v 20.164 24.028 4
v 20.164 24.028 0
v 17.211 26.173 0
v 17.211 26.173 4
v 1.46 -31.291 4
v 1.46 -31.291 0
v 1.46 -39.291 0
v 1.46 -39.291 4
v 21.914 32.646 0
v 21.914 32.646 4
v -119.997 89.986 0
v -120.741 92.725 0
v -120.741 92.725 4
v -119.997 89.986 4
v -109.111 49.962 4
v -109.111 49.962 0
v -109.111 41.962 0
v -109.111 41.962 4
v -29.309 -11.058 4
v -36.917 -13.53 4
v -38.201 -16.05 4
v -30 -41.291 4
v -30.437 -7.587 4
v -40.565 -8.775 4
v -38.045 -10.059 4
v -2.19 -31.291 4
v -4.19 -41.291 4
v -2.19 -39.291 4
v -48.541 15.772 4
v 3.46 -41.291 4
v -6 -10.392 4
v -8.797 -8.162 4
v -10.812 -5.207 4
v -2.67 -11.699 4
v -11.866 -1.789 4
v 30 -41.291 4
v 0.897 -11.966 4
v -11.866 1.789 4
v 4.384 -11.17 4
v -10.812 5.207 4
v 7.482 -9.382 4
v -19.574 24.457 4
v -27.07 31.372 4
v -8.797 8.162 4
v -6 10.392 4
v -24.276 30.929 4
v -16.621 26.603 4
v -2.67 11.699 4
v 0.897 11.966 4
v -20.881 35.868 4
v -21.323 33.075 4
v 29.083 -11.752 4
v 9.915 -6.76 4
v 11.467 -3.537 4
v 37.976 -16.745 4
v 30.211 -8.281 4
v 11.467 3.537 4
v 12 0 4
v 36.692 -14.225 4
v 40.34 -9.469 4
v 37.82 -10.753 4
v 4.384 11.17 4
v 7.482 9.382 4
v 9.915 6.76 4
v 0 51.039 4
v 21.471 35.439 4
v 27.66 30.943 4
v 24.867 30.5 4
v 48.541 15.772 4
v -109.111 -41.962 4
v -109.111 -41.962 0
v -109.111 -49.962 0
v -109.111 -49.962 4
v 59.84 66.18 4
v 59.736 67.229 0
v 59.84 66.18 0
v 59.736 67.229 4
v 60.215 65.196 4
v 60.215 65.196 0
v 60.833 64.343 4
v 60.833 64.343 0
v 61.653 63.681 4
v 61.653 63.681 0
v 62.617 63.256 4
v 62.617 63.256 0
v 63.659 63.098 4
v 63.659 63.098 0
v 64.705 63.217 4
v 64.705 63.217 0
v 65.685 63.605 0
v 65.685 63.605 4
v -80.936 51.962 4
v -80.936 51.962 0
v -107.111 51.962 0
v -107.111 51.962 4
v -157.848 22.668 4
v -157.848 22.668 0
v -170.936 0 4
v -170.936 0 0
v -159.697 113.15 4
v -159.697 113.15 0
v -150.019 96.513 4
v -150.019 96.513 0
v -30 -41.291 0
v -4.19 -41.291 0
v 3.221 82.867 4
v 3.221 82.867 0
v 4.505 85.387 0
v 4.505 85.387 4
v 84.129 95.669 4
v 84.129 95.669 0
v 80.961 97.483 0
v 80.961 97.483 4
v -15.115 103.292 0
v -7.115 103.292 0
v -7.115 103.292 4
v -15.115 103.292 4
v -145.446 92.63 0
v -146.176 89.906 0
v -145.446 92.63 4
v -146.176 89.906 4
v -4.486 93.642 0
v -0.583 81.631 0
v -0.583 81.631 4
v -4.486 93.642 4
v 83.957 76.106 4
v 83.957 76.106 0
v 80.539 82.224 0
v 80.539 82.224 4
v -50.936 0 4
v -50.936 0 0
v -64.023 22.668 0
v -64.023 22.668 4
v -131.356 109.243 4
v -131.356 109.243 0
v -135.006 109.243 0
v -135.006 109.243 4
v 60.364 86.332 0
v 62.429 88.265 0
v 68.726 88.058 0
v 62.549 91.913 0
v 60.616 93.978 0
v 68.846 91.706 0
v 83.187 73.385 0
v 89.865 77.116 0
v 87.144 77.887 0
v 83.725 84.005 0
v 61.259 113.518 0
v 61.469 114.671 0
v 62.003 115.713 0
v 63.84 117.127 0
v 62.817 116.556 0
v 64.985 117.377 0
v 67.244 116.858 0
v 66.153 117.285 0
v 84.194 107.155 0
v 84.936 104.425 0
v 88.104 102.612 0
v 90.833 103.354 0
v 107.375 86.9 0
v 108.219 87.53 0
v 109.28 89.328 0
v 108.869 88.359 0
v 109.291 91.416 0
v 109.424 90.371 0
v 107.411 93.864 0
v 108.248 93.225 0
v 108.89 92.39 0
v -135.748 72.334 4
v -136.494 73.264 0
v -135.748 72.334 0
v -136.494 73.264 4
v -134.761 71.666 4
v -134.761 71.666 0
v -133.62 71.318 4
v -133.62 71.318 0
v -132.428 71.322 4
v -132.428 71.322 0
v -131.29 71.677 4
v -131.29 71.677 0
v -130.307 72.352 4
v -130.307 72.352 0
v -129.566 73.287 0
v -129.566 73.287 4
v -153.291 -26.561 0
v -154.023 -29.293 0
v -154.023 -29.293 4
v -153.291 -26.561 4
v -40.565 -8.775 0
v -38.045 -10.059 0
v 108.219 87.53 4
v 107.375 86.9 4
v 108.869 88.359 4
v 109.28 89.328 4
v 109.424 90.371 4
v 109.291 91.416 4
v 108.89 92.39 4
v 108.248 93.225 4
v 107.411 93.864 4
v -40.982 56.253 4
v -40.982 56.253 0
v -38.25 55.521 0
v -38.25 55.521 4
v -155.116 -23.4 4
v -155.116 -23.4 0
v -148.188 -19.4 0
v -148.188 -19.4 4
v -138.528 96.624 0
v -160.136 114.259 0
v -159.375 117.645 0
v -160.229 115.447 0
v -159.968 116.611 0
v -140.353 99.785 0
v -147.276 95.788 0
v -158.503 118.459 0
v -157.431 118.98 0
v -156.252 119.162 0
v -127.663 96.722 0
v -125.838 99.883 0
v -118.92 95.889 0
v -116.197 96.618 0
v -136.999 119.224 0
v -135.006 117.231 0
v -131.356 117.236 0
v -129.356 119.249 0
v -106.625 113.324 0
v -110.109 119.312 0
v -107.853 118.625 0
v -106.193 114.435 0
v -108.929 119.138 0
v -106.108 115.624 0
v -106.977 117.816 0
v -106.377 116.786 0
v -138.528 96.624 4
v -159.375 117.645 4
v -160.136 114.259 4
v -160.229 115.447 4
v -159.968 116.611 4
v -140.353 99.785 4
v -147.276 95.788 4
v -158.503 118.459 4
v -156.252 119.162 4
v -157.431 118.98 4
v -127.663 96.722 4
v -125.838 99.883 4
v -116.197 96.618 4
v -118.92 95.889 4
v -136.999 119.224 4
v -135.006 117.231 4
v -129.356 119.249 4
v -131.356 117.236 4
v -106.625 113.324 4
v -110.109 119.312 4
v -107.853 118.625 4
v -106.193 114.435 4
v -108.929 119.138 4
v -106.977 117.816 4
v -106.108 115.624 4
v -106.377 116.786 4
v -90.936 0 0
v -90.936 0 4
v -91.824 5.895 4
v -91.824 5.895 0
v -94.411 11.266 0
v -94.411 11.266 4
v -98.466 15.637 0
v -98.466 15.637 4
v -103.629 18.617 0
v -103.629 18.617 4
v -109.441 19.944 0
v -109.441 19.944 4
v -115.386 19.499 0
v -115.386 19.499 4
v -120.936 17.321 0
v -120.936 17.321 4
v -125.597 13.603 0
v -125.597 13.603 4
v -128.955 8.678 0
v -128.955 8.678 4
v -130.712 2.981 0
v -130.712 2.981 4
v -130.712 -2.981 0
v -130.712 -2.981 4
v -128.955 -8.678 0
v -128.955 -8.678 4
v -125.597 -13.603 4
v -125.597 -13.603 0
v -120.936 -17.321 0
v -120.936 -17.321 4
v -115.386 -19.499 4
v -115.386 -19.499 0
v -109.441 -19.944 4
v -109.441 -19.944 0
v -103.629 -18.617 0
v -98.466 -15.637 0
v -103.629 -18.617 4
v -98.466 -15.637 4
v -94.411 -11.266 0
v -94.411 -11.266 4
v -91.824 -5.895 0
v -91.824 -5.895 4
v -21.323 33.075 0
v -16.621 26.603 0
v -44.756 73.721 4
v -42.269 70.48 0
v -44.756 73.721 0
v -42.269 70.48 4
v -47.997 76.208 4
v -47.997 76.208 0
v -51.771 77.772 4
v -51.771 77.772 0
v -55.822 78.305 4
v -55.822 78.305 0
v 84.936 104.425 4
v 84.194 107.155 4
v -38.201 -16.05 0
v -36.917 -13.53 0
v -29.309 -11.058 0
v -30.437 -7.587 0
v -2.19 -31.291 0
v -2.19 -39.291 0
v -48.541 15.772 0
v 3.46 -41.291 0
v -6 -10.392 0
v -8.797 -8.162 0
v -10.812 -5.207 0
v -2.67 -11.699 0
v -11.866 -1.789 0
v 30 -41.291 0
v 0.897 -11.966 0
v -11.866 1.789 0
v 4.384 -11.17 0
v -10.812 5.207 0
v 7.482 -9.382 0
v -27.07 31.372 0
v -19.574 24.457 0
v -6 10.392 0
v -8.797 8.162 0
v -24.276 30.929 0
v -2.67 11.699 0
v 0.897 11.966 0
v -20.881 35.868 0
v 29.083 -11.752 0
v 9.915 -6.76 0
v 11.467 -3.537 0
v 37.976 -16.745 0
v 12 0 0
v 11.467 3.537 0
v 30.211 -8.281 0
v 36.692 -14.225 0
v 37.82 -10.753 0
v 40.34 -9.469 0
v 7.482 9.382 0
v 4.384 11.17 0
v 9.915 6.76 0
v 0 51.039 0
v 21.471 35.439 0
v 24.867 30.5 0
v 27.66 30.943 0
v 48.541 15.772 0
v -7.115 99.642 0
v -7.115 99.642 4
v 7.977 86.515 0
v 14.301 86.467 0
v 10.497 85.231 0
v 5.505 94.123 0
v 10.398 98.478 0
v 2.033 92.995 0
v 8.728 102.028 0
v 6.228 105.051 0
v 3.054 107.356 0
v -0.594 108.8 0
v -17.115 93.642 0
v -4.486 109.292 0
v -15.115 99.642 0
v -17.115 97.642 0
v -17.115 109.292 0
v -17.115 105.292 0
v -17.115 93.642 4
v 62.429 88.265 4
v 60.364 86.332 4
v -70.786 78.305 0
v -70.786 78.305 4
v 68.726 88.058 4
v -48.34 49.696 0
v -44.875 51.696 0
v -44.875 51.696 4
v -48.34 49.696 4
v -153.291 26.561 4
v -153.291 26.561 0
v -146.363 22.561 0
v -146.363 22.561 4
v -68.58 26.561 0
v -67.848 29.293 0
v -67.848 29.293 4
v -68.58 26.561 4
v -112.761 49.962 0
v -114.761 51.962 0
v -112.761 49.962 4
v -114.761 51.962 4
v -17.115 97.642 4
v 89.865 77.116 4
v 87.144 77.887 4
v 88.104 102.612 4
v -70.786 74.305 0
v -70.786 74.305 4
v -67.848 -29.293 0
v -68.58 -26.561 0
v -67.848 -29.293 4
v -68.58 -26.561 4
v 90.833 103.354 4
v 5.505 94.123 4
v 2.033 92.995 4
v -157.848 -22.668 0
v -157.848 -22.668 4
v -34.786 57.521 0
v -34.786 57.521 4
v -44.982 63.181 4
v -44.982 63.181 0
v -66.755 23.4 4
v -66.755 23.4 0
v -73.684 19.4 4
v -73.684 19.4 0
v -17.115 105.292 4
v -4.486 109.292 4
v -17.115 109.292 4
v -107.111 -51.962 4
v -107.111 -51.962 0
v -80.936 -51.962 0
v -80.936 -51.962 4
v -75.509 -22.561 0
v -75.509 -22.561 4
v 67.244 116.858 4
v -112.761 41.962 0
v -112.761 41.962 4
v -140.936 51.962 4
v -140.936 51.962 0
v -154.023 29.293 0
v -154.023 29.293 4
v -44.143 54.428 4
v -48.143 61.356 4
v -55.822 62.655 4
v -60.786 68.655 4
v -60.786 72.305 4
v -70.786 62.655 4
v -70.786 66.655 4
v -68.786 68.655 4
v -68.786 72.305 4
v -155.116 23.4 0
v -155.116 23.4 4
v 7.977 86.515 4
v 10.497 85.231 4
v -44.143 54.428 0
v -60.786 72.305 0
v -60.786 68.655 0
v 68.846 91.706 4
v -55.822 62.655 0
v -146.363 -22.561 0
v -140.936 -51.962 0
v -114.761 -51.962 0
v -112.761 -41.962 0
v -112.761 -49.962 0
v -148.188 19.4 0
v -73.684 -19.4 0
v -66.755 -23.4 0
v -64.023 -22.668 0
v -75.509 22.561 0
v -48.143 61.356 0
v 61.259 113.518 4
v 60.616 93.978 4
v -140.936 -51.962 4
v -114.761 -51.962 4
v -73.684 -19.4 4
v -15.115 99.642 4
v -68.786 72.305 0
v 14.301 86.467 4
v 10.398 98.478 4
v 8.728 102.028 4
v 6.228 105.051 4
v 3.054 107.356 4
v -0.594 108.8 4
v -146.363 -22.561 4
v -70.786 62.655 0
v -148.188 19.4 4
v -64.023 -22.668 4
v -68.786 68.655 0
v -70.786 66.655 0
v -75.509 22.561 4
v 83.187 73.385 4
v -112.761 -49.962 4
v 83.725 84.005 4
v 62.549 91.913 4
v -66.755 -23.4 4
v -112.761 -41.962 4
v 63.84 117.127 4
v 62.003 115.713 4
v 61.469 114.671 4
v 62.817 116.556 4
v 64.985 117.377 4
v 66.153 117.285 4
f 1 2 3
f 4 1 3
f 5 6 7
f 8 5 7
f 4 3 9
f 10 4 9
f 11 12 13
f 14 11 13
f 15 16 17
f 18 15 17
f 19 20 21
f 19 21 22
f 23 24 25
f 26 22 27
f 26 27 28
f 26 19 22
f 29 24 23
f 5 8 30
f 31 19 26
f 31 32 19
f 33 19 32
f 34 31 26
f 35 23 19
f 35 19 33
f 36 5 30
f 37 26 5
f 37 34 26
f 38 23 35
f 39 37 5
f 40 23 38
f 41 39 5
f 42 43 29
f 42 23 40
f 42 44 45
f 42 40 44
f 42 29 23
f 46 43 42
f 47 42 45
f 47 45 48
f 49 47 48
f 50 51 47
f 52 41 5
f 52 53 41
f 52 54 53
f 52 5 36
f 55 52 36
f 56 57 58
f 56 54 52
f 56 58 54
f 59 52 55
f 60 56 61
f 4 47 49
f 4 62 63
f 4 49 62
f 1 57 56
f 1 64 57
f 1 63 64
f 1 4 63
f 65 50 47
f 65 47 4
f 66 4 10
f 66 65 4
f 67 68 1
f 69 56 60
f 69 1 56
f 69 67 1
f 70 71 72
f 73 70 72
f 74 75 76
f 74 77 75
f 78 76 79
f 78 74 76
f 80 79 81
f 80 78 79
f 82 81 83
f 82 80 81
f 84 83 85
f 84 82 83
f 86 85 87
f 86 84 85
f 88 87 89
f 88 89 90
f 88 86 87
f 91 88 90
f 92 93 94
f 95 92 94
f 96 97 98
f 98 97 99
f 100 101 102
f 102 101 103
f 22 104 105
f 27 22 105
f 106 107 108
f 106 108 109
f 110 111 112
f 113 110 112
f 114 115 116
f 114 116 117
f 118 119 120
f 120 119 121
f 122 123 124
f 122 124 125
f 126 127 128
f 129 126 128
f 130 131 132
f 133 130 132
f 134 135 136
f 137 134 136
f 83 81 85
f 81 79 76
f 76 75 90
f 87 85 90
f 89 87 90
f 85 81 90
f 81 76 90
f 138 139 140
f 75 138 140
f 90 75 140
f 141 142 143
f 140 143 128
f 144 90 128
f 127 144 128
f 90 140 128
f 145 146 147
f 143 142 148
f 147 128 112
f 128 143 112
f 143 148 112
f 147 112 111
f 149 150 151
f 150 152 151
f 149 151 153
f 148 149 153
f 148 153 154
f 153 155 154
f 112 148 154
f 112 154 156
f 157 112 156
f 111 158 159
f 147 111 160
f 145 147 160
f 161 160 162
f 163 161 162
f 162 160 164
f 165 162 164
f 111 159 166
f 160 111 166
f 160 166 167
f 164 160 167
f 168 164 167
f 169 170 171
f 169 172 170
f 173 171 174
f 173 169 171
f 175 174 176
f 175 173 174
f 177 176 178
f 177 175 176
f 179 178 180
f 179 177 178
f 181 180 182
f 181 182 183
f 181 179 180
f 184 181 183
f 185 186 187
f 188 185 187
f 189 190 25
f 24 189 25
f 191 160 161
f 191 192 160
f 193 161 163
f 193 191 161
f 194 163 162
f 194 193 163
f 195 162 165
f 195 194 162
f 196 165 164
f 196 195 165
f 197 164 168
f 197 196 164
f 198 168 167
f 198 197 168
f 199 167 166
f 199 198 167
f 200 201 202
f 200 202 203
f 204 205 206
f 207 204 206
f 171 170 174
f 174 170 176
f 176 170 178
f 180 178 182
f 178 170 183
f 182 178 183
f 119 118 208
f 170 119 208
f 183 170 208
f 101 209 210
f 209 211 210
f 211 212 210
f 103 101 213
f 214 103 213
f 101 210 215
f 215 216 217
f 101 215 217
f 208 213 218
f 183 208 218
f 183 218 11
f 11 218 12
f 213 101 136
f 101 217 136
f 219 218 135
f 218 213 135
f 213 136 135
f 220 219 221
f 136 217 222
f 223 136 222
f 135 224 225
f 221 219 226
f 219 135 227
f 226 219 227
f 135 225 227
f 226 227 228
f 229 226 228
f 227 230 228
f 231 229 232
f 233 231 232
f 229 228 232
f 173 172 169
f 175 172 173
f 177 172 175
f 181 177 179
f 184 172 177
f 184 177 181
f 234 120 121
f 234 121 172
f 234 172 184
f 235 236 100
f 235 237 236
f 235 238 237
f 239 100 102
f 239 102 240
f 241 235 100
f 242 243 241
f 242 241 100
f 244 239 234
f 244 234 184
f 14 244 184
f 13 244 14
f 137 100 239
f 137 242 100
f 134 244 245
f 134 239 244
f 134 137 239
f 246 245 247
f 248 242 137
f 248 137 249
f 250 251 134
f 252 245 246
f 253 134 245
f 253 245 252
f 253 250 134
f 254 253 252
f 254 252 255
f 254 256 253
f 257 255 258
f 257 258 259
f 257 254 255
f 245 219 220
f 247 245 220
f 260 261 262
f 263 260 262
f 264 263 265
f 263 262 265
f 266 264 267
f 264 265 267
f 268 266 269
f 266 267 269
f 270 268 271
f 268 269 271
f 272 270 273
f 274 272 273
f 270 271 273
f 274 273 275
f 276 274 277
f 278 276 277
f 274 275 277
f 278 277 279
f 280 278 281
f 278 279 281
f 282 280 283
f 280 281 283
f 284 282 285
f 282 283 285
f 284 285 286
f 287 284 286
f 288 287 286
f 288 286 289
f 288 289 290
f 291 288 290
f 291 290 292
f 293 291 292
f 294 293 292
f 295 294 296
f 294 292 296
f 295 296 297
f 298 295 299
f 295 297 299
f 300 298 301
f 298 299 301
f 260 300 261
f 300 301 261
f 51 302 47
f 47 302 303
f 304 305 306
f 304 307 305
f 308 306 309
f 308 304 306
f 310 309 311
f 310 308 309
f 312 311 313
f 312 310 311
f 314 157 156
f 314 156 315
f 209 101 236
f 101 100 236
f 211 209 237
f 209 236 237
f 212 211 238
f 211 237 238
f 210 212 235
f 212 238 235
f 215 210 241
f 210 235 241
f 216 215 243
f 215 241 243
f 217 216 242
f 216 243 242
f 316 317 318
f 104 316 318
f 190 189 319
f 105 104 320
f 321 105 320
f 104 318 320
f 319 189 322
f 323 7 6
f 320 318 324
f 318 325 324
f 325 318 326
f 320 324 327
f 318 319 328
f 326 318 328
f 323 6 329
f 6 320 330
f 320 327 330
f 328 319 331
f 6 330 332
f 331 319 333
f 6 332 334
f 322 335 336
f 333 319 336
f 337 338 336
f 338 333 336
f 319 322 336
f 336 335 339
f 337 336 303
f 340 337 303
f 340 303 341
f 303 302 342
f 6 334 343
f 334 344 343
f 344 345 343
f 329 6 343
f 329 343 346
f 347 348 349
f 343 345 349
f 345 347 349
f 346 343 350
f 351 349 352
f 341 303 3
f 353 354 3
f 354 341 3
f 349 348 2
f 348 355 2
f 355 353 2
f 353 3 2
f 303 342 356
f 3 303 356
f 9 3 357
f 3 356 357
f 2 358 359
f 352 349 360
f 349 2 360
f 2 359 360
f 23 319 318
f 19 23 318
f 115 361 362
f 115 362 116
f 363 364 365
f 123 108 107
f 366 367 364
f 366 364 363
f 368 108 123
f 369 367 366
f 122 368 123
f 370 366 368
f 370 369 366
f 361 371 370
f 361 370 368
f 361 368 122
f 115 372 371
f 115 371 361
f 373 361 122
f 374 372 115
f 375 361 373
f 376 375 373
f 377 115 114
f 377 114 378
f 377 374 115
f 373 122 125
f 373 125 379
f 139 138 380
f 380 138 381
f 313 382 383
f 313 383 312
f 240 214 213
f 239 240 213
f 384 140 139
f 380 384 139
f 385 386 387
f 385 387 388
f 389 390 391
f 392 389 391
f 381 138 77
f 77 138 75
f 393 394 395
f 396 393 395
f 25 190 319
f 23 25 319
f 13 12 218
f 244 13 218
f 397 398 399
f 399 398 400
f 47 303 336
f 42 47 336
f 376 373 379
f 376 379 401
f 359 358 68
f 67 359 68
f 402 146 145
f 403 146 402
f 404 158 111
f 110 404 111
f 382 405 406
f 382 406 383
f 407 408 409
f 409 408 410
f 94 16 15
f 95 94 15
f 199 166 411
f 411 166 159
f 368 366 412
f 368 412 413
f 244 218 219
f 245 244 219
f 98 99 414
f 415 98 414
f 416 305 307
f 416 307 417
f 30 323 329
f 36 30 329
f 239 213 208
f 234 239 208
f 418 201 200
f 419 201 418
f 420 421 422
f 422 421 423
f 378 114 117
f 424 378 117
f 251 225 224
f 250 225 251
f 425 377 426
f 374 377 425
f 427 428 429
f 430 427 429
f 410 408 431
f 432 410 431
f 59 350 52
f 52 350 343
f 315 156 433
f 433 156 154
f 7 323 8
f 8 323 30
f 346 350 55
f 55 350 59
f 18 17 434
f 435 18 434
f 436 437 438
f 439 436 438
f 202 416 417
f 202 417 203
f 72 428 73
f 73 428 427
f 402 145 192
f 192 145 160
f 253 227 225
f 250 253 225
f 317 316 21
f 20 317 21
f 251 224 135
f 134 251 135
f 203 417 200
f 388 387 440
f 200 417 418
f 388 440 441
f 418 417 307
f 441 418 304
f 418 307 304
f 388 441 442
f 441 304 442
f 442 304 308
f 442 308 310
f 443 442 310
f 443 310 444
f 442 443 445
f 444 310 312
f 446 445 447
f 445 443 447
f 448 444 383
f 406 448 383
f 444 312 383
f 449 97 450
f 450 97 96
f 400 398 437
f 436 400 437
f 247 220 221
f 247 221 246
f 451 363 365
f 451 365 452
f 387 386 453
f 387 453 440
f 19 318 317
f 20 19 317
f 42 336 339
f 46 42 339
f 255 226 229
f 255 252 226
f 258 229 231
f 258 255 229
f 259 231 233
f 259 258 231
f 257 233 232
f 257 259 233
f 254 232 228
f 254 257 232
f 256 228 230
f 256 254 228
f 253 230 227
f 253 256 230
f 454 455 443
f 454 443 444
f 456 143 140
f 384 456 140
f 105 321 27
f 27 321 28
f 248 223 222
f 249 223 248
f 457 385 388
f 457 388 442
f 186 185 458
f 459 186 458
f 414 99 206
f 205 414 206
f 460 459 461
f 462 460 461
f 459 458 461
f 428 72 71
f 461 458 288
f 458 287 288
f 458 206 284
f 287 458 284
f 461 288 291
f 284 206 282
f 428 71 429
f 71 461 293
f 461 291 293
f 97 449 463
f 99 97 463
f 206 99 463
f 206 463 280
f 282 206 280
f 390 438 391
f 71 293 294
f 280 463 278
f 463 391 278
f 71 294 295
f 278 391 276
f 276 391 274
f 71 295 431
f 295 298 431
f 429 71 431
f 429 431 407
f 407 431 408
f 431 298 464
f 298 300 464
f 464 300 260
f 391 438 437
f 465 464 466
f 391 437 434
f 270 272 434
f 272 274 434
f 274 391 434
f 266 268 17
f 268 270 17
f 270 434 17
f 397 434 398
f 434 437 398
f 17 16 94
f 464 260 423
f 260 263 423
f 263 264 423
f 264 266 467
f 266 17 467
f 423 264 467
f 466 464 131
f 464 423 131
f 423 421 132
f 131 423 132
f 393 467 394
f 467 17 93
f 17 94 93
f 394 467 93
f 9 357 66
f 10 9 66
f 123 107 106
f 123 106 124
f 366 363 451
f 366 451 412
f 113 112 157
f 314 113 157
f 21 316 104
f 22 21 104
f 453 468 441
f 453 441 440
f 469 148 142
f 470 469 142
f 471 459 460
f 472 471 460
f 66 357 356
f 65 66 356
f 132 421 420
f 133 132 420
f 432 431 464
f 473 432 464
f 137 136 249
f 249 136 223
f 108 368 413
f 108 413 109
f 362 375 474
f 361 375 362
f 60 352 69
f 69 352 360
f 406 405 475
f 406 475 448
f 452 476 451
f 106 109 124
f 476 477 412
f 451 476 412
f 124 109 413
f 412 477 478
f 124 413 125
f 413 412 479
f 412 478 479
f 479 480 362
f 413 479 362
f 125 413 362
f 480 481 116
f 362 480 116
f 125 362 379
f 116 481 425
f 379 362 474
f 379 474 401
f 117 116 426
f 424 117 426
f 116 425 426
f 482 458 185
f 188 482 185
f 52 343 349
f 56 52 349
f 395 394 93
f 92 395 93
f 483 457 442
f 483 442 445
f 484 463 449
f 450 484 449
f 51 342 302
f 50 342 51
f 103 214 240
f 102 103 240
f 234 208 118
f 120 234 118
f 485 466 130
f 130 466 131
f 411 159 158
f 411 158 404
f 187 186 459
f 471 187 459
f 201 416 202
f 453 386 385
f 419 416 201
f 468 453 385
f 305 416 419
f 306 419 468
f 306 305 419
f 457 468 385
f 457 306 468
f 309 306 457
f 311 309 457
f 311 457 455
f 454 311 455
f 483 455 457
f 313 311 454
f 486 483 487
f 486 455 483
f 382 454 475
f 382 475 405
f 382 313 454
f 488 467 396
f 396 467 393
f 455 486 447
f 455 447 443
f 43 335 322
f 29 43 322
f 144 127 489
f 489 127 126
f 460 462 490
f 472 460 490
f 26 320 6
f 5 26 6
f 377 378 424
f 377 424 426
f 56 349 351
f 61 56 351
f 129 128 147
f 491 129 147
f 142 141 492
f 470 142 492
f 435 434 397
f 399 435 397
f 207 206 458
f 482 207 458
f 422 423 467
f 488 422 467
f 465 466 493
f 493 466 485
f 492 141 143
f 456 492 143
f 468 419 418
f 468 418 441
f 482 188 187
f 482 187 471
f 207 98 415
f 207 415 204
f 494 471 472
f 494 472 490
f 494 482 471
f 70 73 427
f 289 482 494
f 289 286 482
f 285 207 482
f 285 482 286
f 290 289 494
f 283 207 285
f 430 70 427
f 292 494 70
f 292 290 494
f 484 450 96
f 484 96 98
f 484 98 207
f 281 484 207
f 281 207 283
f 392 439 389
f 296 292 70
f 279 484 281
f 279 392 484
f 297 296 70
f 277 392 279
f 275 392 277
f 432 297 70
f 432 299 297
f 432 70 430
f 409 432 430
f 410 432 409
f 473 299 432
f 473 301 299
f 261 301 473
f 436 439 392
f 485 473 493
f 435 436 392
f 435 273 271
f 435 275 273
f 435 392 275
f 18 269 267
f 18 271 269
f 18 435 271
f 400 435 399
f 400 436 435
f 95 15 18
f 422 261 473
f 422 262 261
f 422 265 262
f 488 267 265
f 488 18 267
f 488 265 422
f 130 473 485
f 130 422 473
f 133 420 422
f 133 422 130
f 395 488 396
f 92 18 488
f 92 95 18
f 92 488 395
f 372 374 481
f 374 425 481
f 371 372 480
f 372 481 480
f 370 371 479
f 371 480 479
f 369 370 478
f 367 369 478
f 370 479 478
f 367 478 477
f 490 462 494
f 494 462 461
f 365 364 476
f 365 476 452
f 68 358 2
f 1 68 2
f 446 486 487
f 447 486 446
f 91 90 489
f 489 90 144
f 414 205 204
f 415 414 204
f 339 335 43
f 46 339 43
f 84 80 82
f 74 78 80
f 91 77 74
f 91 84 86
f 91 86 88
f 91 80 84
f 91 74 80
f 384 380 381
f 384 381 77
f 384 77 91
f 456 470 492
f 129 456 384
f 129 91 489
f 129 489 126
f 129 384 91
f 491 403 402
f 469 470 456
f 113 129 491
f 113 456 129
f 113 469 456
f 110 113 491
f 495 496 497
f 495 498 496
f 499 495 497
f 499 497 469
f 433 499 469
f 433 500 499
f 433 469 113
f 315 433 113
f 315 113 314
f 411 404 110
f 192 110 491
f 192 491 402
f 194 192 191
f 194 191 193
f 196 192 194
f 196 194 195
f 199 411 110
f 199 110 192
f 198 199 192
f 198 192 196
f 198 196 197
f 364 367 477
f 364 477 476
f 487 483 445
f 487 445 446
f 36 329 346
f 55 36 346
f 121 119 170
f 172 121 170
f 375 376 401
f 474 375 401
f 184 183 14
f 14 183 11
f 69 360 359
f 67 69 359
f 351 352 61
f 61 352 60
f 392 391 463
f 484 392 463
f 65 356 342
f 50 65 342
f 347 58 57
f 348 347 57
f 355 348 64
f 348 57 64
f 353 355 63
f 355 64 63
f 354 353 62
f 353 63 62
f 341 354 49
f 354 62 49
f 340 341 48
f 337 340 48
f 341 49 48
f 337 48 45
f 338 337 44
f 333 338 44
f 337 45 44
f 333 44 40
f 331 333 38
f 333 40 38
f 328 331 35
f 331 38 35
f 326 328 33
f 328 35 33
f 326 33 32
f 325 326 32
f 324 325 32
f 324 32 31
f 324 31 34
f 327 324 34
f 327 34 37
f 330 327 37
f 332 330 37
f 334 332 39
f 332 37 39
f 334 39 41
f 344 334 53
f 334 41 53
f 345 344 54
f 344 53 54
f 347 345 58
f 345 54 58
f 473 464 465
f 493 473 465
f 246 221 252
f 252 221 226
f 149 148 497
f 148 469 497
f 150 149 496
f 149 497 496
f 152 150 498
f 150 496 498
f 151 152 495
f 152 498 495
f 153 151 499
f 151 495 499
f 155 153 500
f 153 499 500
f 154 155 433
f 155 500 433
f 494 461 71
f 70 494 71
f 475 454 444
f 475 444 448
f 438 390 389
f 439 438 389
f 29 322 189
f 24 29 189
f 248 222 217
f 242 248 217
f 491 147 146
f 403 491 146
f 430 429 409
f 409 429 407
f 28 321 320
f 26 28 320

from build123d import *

# Parameters (mm, degrees)
SALIENTE_EXTRUIR1_DEPTH = 4
CHAFL_N1_SIZE           = 2
SALIENTE_EXTRUIR2_DEPTH = 4
CHAFL_N2_SIZE           = 2
SALIENTE_EXTRUIR3_DEPTH = 4
CHAFL_N3_SIZE           = 2
REDONDEO1_R             = 15.65
SALIENTE_EXTRUIR4_DEPTH = 4
REDONDEO2_R             = 15.65
CHAFL_N4_SIZE           = 2
CROQUIS5_R              = 20
CROQUIS5_R_2            = 12
CORTAR_EXTRUIR1_DEPTH   = 4
SALIENTE_EXTRUIR6_DEPTH = 4
REDONDEO4_R             = 4
SALIENTE_EXTRUIR7_DEPTH = 4
REDONDEO5_R             = 4
CHAFL_N5_SIZE           = 2
CHAFL_N5_SIZE2          = 1.993496113
CHAFL_N5_EDGE_2_SIZE    = 2
CHAFL_N5_EDGE_2_SIZE2   = 2.006567963
CHAFL_N5_EDGE_3_SIZE    = 1.993496113
CHAFL_N5_EDGE_3_SIZE2   = 2
CHAFL_N5_EDGE_4_SIZE    = 2.006567963
CHAFL_N5_EDGE_4_SIZE2   = 2
CHAFL_N5_EDGE_5_SIZE    = 1.993496113
CHAFL_N5_EDGE_5_SIZE2   = 2
CHAFL_N5_EDGE_6_SIZE    = 2
CHAFL_N5_EDGE_6_SIZE2   = 2.006567963
CHAFL_N6_SIZE           = 2


with BuildPart() as part:
    # Croquis1 → Saliente-Extruir1 (new body)
    with BuildSketch(Plane.XY):
        Polygon((-22.498762614, 34.692740635), (-16.620910091, 26.602570691), (-19.57382212, 24.45715452), (-25.451674643, 32.547324464), (-48.541019662, 15.771933364), (-39.947257049, -10.676948355), (-30.436691886, -7.586778411), (-29.308779857, -11.058134695), (-38.819345019, -14.148304639), (-30, -41.291457614), (-2.19, -41.291457614), (-2.19, -31.291457614), (1.46, -31.291457614), (1.46, -41.291457614), (30, -41.291457614), (38.593762614, -14.842575896), (29.083197451, -11.752405952), (30.21110948, -8.281049668), (39.721674643, -11.371219611), (48.541019662, 15.771933364), (26.042257049, 32.11824123), (20.164404526, 24.028071286), (17.211492497, 26.173487457), (23.089345019, 34.263657401), (0, 51.039048501), align=None)
    extrude(amount=SALIENTE_EXTRUIR1_DEPTH)

    # Chaflán1
    chafl_n1_edges = [part.edges().sort_by_distance(p)[0] for p in [
        (23.089345019, 34.263657401, 2),
        (26.042257049, 32.11824123, 2),
        (39.721674643, -11.371219611, 2),
        (38.593762614, -14.842575896, 2),
        (1.46, -41.291457614, 2),
        (-2.19, -41.291457614, 2),
        (-38.819345019, -14.148304639, 2),
        (-39.947257049, -10.676948355, 2),
        (-25.451674643, 32.547324464, 2),
        (-22.498762614, 34.692740635, 2),
    ]]
    chamfer(chafl_n1_edges, length=CHAFL_N1_SIZE)


with BuildPart() as body_2:
    # Croquis2 → Saliente-Extruir2 (new body)
    with BuildSketch(Plane.XY):
        Polygon((-50.935771969, 0), (-65.023271969, 24.400265752), (-73.683526006, 19.400265752), (-75.508526006, 22.561258475), (-66.848271969, 27.561258475), (-80.935771969, 51.961524227), (-109.110771969, 51.961524227), (-109.110771969, 41.961524227), (-112.760771969, 41.961524227), (-112.760771969, 51.961524227), (-140.935771969, 51.961524227), (-155.023271969, 27.561258475), (-146.363017931, 22.561258475), (-148.188017931, 19.400265752), (-156.848271969, 24.400265752), (-170.935771969, 0), (-156.848271969, -24.400265752), (-148.188017931, -19.400265752), (-146.363017931, -22.561258475), (-155.023271969, -27.561258475), (-140.935771969, -51.961524227), (-112.760771969, -51.961524227), (-112.760771969, -41.961524227), (-109.110771969, -41.961524227), (-109.110771969, -51.961524227), (-80.935771969, -51.961524227), (-66.848271969, -27.561258475), (-75.508526006, -22.561258475), (-73.683526006, -19.400265752), (-65.023271969, -24.400265752), align=None)
    extrude(amount=SALIENTE_EXTRUIR2_DEPTH)

    # Chaflán2
    chafl_n2_edges = [body_2.edges().sort_by_distance(p)[0] for p in [
        (-65.023271969, -24.400265752, 2),
        (-66.848271969, -27.561258475, 2),
        (-109.110771969, -51.961524227, 2),
        (-112.760771969, -51.961524227, 2),
        (-155.023271969, -27.561258475, 2),
        (-156.848271969, -24.400265752, 2),
        (-156.848271969, 24.400265752, 2),
        (-155.023271969, 27.561258475, 2),
        (-112.760771969, 51.961524227, 2),
        (-109.110771969, 51.961524227, 2),
        (-66.848271969, 27.561258475, 2),
        (-65.023271969, 24.400265752, 2),
    ]]
    chamfer(chafl_n2_edges, length=CHAFL_N2_SIZE)


with BuildPart() as body_3:
    # Croquis3 → Saliente-Extruir3 (new body)
    with BuildSketch(Plane.XY):
        Polygon((-70.786284867, 78.305161206), (-46.786284867, 78.305161206), (-34.786284867, 57.520551515), (-39.98243729, 54.520551515), (-44.98243729, 63.180805553), (-48.143430014, 61.355805553), (-43.143430014, 52.695551515), (-48.339582437, 49.695551515), (-55.82181658, 62.655161206), (-70.786284867, 62.655161206), (-70.786284867, 68.655161206), (-60.786284867, 68.655161206), (-60.786284867, 72.305161206), (-70.786284867, 72.305161206), align=None)
    extrude(amount=SALIENTE_EXTRUIR3_DEPTH)

    # Chaflán3
    chafl_n3_edges = [body_3.edges().sort_by_distance(p)[0] for p in [
        (-39.98243729, 54.520551515, 2),
        (-43.143430014, 52.695551515, 2),
        (-70.786284867, 68.655161206, 2),
        (-70.786284867, 72.305161206, 2),
    ]]
    chamfer(chafl_n3_edges, length=CHAFL_N3_SIZE)

    # Redondeo1
    redondeo1_edges = [body_3.edges().sort_by_distance(p)[0] for p in [
        (-46.786284867, 78.305161206, 2),
    ]]
    fillet(redondeo1_edges, radius=REDONDEO1_R)


with BuildPart() as body_4:
    # Croquis4 → Saliente-Extruir4 (new body)
    with BuildSketch(Plane.XY):
        Polygon((-17.115231159, 109.292158512), (6.884768841, 109.292158512), (14.301176706, 86.466802121), (8.594837608, 84.612700155), (5.504667664, 94.123265318), (2.03331138, 92.995353288), (5.123481324, 83.484788125), (-0.582857774, 81.630686159), (-4.485621722, 93.642158512), (-17.115231159, 93.642158512), (-17.115231159, 99.642158512), (-7.115231159, 99.642158512), (-7.115231159, 103.292158512), (-17.115231159, 103.292158512), align=None)
    extrude(amount=SALIENTE_EXTRUIR4_DEPTH)

    # Redondeo2
    redondeo2_edges = [body_4.edges().sort_by_distance(p)[0] for p in [
        (6.884768841, 109.292158512, 2),
    ]]
    fillet(redondeo2_edges, radius=REDONDEO2_R)

    # Chaflán4
    chafl_n4_edges = [body_4.edges().sort_by_distance(p)[0] for p in [
        (8.594837608, 84.612700155, 2),
        (5.123481324, 83.484788125, 2),
        (-17.115231159, 99.642158512, 2),
        (-17.115231159, 103.292158512, 2),
    ]]
    chamfer(chafl_n4_edges, length=CHAFL_N4_SIZE)


with BuildPart() as cortar_extruir1_tool:
    # Croquis5 → Cortar-Extruir1 (new body)
    with BuildSketch(Plane.XY.offset(4)):
        with Locations((-110.935771969, 0)):
            Circle(CROQUIS5_R)
        Circle(CROQUIS5_R_2)
    extrude(amount=-CORTAR_EXTRUIR1_DEPTH)


with BuildPart() as part_1:
    add(part.part)

    # Cortar-Extruir1: cut by cortar_extruir1_tool
    add(cortar_extruir1_tool.part, mode=Mode.SUBTRACT)


with BuildPart() as body_2_1:
    add(body_2.part)

    # Cortar-Extruir1: cut by cortar_extruir1_tool
    add(cortar_extruir1_tool.part, mode=Mode.SUBTRACT)


with BuildPart() as body_5:
    # Croquis8 → Saliente-Extruir6 (new body)
    with BuildSketch(Plane.XY):
        Polygon((-163.180597318, 119.138873384), (-149.013359447, 94.784644314), (-140.353105409, 99.784644314), (-138.528105409, 96.62365159), (-147.178029607, 91.629615526), (-133.010791736, 67.275386456), (-119.003029607, 91.721688889), (-127.663283645, 96.721688889), (-125.838283645, 99.882681613), (-117.188359447, 94.888645548), (-103.180597318, 119.334947981), (-131.355597318, 119.242874618), (-131.355597318, 109.242874618), (-135.005597318, 109.242874618), (-135.005597318, 119.230946747), align=None)
    extrude(amount=SALIENTE_EXTRUIR6_DEPTH)

    # Redondeo4
    redondeo4_edges = [body_5.edges().sort_by_distance(p)[0] for p in [
        (-163.180597318, 119.138873384, 2),
        (-103.180597318, 119.334947981, 2),
        (-133.010791736, 67.275386456, 2),
    ]]
    fillet(redondeo4_edges, radius=REDONDEO4_R)

    # Chaflán5
    chafl_n5_edges = [body_5.edges().sort_by_distance(p)[0] for p in [
        (-147.178029607, 91.629615526, 2),
    ]]
    chafl_n5_side = [body_5.faces().sort_by_distance(p)[0] for p in [
        (-142.853067508, 94.126633558, 2),
    ]]
    chamfer(chafl_n5_edges, length=CHAFL_N5_SIZE, length2=CHAFL_N5_SIZE2, reference=chafl_n5_side[0])

    # Chaflán5 edge 2
    chafl_n5_edge_2_edges = [body_5.edges().sort_by_distance(p)[0] for p in [
        (-149.013359447, 94.784644314, 2),
    ]]
    chafl_n5_edge_2_side = [body_5.faces().sort_by_distance(p)[0] for p in [
        (-154.355133146, 103.967435023, 2),
    ]]
    chamfer(chafl_n5_edge_2_edges, length=CHAFL_N5_EDGE_2_SIZE, length2=CHAFL_N5_EDGE_2_SIZE2, reference=chafl_n5_edge_2_side[0])

    # Chaflán5 edge 3
    chafl_n5_edge_3_edges = [body_5.edges().sort_by_distance(p)[0] for p in [
        (-135.005597318, 119.230946747, 2),
    ]]
    chafl_n5_edge_3_side = [body_5.faces().sort_by_distance(p)[0] for p in [
        (-145.6290142, 119.196230377, 2),
    ]]
    chamfer(chafl_n5_edge_3_edges, length=CHAFL_N5_EDGE_3_SIZE, length2=CHAFL_N5_EDGE_3_SIZE2, reference=chafl_n5_edge_3_side[0])

    # Chaflán5 edge 4
    chafl_n5_edge_4_edges = [body_5.edges().sort_by_distance(p)[0] for p in [
        (-131.355597318, 119.242874618, 2),
    ]]
    chafl_n5_edge_4_side = [body_5.faces().sort_by_distance(p)[0] for p in [
        (-131.355597318, 114.242874618, 2),
    ]]
    chamfer(chafl_n5_edge_4_edges, length=CHAFL_N5_EDGE_4_SIZE, length2=CHAFL_N5_EDGE_4_SIZE2, reference=chafl_n5_edge_4_side[0])

    # Chaflán5 edge 5
    chafl_n5_edge_5_edges = [body_5.edges().sort_by_distance(p)[0] for p in [
        (-117.188359447, 94.888645548, 2),
    ]]
    chafl_n5_edge_5_side = [body_5.faces().sort_by_distance(p)[0] for p in [
        (-111.906716264, 104.106152628, 2),
    ]]
    chamfer(chafl_n5_edge_5_edges, length=CHAFL_N5_EDGE_5_SIZE, length2=CHAFL_N5_EDGE_5_SIZE2, reference=chafl_n5_edge_5_side[0])

    # Chaflán5 edge 6
    chafl_n5_edge_6_edges = [body_5.edges().sort_by_distance(p)[0] for p in [
        (-119.003029607, 91.721688889, 2),
    ]]
    chafl_n5_edge_6_side = [body_5.faces().sort_by_distance(p)[0] for p in [
        (-124.28467279, 82.504181809, 2),
    ]]
    chamfer(chafl_n5_edge_6_edges, length=CHAFL_N5_EDGE_6_SIZE, length2=CHAFL_N5_EDGE_6_SIZE2, reference=chafl_n5_edge_6_side[0])


with BuildPart() as body_6:
    # Croquis7 → Saliente-Extruir7 (new body)
    with BuildSketch(Plane.XY):
        Polygon((61.477596493, 120.158850294), (60.550315351, 91.979032037), (68.845638112, 91.706067311), (68.725596697, 88.05804181), (60.430273936, 88.331006536), (59.502992794, 60.151188278), (84.932843055, 74.360403009), (80.538692496, 82.224496335), (83.725020717, 84.004893051), (88.119171276, 76.140799725), (113.549021536, 90.350014456), (89.097148193, 104.347746952), (84.129008887, 95.669176111), (80.96133053, 97.482546958), (85.929469836, 106.161117799), align=None)
    extrude(amount=SALIENTE_EXTRUIR7_DEPTH)

    # Redondeo5
    redondeo5_edges = [body_6.edges().sort_by_distance(p)[0] for p in [
        (113.549021536, 90.350014456, 2),
        (59.502992794, 60.151188278, 2),
        (61.477596493, 120.158850294, 2),
    ]]
    fillet(redondeo5_edges, radius=REDONDEO5_R)

    # Chaflán6
    chafl_n6_edges = [body_6.edges().sort_by_distance(p)[0] for p in [
        (85.929469836, 106.161117799, 2),
        (89.097148193, 104.347746952, 2),
        (88.119171276, 76.140799725, 2),
        (84.932843055, 74.360403009, 2),
        (60.430273936, 88.331006536, 2),
        (60.550315351, 91.979032037, 2),
    ]]
    chamfer(chafl_n6_edges, length=CHAFL_N6_SIZE)


solid = Compound([body_3.part, body_4.part, part_1.part, body_2_1.part, body_5.part, body_6.part])
